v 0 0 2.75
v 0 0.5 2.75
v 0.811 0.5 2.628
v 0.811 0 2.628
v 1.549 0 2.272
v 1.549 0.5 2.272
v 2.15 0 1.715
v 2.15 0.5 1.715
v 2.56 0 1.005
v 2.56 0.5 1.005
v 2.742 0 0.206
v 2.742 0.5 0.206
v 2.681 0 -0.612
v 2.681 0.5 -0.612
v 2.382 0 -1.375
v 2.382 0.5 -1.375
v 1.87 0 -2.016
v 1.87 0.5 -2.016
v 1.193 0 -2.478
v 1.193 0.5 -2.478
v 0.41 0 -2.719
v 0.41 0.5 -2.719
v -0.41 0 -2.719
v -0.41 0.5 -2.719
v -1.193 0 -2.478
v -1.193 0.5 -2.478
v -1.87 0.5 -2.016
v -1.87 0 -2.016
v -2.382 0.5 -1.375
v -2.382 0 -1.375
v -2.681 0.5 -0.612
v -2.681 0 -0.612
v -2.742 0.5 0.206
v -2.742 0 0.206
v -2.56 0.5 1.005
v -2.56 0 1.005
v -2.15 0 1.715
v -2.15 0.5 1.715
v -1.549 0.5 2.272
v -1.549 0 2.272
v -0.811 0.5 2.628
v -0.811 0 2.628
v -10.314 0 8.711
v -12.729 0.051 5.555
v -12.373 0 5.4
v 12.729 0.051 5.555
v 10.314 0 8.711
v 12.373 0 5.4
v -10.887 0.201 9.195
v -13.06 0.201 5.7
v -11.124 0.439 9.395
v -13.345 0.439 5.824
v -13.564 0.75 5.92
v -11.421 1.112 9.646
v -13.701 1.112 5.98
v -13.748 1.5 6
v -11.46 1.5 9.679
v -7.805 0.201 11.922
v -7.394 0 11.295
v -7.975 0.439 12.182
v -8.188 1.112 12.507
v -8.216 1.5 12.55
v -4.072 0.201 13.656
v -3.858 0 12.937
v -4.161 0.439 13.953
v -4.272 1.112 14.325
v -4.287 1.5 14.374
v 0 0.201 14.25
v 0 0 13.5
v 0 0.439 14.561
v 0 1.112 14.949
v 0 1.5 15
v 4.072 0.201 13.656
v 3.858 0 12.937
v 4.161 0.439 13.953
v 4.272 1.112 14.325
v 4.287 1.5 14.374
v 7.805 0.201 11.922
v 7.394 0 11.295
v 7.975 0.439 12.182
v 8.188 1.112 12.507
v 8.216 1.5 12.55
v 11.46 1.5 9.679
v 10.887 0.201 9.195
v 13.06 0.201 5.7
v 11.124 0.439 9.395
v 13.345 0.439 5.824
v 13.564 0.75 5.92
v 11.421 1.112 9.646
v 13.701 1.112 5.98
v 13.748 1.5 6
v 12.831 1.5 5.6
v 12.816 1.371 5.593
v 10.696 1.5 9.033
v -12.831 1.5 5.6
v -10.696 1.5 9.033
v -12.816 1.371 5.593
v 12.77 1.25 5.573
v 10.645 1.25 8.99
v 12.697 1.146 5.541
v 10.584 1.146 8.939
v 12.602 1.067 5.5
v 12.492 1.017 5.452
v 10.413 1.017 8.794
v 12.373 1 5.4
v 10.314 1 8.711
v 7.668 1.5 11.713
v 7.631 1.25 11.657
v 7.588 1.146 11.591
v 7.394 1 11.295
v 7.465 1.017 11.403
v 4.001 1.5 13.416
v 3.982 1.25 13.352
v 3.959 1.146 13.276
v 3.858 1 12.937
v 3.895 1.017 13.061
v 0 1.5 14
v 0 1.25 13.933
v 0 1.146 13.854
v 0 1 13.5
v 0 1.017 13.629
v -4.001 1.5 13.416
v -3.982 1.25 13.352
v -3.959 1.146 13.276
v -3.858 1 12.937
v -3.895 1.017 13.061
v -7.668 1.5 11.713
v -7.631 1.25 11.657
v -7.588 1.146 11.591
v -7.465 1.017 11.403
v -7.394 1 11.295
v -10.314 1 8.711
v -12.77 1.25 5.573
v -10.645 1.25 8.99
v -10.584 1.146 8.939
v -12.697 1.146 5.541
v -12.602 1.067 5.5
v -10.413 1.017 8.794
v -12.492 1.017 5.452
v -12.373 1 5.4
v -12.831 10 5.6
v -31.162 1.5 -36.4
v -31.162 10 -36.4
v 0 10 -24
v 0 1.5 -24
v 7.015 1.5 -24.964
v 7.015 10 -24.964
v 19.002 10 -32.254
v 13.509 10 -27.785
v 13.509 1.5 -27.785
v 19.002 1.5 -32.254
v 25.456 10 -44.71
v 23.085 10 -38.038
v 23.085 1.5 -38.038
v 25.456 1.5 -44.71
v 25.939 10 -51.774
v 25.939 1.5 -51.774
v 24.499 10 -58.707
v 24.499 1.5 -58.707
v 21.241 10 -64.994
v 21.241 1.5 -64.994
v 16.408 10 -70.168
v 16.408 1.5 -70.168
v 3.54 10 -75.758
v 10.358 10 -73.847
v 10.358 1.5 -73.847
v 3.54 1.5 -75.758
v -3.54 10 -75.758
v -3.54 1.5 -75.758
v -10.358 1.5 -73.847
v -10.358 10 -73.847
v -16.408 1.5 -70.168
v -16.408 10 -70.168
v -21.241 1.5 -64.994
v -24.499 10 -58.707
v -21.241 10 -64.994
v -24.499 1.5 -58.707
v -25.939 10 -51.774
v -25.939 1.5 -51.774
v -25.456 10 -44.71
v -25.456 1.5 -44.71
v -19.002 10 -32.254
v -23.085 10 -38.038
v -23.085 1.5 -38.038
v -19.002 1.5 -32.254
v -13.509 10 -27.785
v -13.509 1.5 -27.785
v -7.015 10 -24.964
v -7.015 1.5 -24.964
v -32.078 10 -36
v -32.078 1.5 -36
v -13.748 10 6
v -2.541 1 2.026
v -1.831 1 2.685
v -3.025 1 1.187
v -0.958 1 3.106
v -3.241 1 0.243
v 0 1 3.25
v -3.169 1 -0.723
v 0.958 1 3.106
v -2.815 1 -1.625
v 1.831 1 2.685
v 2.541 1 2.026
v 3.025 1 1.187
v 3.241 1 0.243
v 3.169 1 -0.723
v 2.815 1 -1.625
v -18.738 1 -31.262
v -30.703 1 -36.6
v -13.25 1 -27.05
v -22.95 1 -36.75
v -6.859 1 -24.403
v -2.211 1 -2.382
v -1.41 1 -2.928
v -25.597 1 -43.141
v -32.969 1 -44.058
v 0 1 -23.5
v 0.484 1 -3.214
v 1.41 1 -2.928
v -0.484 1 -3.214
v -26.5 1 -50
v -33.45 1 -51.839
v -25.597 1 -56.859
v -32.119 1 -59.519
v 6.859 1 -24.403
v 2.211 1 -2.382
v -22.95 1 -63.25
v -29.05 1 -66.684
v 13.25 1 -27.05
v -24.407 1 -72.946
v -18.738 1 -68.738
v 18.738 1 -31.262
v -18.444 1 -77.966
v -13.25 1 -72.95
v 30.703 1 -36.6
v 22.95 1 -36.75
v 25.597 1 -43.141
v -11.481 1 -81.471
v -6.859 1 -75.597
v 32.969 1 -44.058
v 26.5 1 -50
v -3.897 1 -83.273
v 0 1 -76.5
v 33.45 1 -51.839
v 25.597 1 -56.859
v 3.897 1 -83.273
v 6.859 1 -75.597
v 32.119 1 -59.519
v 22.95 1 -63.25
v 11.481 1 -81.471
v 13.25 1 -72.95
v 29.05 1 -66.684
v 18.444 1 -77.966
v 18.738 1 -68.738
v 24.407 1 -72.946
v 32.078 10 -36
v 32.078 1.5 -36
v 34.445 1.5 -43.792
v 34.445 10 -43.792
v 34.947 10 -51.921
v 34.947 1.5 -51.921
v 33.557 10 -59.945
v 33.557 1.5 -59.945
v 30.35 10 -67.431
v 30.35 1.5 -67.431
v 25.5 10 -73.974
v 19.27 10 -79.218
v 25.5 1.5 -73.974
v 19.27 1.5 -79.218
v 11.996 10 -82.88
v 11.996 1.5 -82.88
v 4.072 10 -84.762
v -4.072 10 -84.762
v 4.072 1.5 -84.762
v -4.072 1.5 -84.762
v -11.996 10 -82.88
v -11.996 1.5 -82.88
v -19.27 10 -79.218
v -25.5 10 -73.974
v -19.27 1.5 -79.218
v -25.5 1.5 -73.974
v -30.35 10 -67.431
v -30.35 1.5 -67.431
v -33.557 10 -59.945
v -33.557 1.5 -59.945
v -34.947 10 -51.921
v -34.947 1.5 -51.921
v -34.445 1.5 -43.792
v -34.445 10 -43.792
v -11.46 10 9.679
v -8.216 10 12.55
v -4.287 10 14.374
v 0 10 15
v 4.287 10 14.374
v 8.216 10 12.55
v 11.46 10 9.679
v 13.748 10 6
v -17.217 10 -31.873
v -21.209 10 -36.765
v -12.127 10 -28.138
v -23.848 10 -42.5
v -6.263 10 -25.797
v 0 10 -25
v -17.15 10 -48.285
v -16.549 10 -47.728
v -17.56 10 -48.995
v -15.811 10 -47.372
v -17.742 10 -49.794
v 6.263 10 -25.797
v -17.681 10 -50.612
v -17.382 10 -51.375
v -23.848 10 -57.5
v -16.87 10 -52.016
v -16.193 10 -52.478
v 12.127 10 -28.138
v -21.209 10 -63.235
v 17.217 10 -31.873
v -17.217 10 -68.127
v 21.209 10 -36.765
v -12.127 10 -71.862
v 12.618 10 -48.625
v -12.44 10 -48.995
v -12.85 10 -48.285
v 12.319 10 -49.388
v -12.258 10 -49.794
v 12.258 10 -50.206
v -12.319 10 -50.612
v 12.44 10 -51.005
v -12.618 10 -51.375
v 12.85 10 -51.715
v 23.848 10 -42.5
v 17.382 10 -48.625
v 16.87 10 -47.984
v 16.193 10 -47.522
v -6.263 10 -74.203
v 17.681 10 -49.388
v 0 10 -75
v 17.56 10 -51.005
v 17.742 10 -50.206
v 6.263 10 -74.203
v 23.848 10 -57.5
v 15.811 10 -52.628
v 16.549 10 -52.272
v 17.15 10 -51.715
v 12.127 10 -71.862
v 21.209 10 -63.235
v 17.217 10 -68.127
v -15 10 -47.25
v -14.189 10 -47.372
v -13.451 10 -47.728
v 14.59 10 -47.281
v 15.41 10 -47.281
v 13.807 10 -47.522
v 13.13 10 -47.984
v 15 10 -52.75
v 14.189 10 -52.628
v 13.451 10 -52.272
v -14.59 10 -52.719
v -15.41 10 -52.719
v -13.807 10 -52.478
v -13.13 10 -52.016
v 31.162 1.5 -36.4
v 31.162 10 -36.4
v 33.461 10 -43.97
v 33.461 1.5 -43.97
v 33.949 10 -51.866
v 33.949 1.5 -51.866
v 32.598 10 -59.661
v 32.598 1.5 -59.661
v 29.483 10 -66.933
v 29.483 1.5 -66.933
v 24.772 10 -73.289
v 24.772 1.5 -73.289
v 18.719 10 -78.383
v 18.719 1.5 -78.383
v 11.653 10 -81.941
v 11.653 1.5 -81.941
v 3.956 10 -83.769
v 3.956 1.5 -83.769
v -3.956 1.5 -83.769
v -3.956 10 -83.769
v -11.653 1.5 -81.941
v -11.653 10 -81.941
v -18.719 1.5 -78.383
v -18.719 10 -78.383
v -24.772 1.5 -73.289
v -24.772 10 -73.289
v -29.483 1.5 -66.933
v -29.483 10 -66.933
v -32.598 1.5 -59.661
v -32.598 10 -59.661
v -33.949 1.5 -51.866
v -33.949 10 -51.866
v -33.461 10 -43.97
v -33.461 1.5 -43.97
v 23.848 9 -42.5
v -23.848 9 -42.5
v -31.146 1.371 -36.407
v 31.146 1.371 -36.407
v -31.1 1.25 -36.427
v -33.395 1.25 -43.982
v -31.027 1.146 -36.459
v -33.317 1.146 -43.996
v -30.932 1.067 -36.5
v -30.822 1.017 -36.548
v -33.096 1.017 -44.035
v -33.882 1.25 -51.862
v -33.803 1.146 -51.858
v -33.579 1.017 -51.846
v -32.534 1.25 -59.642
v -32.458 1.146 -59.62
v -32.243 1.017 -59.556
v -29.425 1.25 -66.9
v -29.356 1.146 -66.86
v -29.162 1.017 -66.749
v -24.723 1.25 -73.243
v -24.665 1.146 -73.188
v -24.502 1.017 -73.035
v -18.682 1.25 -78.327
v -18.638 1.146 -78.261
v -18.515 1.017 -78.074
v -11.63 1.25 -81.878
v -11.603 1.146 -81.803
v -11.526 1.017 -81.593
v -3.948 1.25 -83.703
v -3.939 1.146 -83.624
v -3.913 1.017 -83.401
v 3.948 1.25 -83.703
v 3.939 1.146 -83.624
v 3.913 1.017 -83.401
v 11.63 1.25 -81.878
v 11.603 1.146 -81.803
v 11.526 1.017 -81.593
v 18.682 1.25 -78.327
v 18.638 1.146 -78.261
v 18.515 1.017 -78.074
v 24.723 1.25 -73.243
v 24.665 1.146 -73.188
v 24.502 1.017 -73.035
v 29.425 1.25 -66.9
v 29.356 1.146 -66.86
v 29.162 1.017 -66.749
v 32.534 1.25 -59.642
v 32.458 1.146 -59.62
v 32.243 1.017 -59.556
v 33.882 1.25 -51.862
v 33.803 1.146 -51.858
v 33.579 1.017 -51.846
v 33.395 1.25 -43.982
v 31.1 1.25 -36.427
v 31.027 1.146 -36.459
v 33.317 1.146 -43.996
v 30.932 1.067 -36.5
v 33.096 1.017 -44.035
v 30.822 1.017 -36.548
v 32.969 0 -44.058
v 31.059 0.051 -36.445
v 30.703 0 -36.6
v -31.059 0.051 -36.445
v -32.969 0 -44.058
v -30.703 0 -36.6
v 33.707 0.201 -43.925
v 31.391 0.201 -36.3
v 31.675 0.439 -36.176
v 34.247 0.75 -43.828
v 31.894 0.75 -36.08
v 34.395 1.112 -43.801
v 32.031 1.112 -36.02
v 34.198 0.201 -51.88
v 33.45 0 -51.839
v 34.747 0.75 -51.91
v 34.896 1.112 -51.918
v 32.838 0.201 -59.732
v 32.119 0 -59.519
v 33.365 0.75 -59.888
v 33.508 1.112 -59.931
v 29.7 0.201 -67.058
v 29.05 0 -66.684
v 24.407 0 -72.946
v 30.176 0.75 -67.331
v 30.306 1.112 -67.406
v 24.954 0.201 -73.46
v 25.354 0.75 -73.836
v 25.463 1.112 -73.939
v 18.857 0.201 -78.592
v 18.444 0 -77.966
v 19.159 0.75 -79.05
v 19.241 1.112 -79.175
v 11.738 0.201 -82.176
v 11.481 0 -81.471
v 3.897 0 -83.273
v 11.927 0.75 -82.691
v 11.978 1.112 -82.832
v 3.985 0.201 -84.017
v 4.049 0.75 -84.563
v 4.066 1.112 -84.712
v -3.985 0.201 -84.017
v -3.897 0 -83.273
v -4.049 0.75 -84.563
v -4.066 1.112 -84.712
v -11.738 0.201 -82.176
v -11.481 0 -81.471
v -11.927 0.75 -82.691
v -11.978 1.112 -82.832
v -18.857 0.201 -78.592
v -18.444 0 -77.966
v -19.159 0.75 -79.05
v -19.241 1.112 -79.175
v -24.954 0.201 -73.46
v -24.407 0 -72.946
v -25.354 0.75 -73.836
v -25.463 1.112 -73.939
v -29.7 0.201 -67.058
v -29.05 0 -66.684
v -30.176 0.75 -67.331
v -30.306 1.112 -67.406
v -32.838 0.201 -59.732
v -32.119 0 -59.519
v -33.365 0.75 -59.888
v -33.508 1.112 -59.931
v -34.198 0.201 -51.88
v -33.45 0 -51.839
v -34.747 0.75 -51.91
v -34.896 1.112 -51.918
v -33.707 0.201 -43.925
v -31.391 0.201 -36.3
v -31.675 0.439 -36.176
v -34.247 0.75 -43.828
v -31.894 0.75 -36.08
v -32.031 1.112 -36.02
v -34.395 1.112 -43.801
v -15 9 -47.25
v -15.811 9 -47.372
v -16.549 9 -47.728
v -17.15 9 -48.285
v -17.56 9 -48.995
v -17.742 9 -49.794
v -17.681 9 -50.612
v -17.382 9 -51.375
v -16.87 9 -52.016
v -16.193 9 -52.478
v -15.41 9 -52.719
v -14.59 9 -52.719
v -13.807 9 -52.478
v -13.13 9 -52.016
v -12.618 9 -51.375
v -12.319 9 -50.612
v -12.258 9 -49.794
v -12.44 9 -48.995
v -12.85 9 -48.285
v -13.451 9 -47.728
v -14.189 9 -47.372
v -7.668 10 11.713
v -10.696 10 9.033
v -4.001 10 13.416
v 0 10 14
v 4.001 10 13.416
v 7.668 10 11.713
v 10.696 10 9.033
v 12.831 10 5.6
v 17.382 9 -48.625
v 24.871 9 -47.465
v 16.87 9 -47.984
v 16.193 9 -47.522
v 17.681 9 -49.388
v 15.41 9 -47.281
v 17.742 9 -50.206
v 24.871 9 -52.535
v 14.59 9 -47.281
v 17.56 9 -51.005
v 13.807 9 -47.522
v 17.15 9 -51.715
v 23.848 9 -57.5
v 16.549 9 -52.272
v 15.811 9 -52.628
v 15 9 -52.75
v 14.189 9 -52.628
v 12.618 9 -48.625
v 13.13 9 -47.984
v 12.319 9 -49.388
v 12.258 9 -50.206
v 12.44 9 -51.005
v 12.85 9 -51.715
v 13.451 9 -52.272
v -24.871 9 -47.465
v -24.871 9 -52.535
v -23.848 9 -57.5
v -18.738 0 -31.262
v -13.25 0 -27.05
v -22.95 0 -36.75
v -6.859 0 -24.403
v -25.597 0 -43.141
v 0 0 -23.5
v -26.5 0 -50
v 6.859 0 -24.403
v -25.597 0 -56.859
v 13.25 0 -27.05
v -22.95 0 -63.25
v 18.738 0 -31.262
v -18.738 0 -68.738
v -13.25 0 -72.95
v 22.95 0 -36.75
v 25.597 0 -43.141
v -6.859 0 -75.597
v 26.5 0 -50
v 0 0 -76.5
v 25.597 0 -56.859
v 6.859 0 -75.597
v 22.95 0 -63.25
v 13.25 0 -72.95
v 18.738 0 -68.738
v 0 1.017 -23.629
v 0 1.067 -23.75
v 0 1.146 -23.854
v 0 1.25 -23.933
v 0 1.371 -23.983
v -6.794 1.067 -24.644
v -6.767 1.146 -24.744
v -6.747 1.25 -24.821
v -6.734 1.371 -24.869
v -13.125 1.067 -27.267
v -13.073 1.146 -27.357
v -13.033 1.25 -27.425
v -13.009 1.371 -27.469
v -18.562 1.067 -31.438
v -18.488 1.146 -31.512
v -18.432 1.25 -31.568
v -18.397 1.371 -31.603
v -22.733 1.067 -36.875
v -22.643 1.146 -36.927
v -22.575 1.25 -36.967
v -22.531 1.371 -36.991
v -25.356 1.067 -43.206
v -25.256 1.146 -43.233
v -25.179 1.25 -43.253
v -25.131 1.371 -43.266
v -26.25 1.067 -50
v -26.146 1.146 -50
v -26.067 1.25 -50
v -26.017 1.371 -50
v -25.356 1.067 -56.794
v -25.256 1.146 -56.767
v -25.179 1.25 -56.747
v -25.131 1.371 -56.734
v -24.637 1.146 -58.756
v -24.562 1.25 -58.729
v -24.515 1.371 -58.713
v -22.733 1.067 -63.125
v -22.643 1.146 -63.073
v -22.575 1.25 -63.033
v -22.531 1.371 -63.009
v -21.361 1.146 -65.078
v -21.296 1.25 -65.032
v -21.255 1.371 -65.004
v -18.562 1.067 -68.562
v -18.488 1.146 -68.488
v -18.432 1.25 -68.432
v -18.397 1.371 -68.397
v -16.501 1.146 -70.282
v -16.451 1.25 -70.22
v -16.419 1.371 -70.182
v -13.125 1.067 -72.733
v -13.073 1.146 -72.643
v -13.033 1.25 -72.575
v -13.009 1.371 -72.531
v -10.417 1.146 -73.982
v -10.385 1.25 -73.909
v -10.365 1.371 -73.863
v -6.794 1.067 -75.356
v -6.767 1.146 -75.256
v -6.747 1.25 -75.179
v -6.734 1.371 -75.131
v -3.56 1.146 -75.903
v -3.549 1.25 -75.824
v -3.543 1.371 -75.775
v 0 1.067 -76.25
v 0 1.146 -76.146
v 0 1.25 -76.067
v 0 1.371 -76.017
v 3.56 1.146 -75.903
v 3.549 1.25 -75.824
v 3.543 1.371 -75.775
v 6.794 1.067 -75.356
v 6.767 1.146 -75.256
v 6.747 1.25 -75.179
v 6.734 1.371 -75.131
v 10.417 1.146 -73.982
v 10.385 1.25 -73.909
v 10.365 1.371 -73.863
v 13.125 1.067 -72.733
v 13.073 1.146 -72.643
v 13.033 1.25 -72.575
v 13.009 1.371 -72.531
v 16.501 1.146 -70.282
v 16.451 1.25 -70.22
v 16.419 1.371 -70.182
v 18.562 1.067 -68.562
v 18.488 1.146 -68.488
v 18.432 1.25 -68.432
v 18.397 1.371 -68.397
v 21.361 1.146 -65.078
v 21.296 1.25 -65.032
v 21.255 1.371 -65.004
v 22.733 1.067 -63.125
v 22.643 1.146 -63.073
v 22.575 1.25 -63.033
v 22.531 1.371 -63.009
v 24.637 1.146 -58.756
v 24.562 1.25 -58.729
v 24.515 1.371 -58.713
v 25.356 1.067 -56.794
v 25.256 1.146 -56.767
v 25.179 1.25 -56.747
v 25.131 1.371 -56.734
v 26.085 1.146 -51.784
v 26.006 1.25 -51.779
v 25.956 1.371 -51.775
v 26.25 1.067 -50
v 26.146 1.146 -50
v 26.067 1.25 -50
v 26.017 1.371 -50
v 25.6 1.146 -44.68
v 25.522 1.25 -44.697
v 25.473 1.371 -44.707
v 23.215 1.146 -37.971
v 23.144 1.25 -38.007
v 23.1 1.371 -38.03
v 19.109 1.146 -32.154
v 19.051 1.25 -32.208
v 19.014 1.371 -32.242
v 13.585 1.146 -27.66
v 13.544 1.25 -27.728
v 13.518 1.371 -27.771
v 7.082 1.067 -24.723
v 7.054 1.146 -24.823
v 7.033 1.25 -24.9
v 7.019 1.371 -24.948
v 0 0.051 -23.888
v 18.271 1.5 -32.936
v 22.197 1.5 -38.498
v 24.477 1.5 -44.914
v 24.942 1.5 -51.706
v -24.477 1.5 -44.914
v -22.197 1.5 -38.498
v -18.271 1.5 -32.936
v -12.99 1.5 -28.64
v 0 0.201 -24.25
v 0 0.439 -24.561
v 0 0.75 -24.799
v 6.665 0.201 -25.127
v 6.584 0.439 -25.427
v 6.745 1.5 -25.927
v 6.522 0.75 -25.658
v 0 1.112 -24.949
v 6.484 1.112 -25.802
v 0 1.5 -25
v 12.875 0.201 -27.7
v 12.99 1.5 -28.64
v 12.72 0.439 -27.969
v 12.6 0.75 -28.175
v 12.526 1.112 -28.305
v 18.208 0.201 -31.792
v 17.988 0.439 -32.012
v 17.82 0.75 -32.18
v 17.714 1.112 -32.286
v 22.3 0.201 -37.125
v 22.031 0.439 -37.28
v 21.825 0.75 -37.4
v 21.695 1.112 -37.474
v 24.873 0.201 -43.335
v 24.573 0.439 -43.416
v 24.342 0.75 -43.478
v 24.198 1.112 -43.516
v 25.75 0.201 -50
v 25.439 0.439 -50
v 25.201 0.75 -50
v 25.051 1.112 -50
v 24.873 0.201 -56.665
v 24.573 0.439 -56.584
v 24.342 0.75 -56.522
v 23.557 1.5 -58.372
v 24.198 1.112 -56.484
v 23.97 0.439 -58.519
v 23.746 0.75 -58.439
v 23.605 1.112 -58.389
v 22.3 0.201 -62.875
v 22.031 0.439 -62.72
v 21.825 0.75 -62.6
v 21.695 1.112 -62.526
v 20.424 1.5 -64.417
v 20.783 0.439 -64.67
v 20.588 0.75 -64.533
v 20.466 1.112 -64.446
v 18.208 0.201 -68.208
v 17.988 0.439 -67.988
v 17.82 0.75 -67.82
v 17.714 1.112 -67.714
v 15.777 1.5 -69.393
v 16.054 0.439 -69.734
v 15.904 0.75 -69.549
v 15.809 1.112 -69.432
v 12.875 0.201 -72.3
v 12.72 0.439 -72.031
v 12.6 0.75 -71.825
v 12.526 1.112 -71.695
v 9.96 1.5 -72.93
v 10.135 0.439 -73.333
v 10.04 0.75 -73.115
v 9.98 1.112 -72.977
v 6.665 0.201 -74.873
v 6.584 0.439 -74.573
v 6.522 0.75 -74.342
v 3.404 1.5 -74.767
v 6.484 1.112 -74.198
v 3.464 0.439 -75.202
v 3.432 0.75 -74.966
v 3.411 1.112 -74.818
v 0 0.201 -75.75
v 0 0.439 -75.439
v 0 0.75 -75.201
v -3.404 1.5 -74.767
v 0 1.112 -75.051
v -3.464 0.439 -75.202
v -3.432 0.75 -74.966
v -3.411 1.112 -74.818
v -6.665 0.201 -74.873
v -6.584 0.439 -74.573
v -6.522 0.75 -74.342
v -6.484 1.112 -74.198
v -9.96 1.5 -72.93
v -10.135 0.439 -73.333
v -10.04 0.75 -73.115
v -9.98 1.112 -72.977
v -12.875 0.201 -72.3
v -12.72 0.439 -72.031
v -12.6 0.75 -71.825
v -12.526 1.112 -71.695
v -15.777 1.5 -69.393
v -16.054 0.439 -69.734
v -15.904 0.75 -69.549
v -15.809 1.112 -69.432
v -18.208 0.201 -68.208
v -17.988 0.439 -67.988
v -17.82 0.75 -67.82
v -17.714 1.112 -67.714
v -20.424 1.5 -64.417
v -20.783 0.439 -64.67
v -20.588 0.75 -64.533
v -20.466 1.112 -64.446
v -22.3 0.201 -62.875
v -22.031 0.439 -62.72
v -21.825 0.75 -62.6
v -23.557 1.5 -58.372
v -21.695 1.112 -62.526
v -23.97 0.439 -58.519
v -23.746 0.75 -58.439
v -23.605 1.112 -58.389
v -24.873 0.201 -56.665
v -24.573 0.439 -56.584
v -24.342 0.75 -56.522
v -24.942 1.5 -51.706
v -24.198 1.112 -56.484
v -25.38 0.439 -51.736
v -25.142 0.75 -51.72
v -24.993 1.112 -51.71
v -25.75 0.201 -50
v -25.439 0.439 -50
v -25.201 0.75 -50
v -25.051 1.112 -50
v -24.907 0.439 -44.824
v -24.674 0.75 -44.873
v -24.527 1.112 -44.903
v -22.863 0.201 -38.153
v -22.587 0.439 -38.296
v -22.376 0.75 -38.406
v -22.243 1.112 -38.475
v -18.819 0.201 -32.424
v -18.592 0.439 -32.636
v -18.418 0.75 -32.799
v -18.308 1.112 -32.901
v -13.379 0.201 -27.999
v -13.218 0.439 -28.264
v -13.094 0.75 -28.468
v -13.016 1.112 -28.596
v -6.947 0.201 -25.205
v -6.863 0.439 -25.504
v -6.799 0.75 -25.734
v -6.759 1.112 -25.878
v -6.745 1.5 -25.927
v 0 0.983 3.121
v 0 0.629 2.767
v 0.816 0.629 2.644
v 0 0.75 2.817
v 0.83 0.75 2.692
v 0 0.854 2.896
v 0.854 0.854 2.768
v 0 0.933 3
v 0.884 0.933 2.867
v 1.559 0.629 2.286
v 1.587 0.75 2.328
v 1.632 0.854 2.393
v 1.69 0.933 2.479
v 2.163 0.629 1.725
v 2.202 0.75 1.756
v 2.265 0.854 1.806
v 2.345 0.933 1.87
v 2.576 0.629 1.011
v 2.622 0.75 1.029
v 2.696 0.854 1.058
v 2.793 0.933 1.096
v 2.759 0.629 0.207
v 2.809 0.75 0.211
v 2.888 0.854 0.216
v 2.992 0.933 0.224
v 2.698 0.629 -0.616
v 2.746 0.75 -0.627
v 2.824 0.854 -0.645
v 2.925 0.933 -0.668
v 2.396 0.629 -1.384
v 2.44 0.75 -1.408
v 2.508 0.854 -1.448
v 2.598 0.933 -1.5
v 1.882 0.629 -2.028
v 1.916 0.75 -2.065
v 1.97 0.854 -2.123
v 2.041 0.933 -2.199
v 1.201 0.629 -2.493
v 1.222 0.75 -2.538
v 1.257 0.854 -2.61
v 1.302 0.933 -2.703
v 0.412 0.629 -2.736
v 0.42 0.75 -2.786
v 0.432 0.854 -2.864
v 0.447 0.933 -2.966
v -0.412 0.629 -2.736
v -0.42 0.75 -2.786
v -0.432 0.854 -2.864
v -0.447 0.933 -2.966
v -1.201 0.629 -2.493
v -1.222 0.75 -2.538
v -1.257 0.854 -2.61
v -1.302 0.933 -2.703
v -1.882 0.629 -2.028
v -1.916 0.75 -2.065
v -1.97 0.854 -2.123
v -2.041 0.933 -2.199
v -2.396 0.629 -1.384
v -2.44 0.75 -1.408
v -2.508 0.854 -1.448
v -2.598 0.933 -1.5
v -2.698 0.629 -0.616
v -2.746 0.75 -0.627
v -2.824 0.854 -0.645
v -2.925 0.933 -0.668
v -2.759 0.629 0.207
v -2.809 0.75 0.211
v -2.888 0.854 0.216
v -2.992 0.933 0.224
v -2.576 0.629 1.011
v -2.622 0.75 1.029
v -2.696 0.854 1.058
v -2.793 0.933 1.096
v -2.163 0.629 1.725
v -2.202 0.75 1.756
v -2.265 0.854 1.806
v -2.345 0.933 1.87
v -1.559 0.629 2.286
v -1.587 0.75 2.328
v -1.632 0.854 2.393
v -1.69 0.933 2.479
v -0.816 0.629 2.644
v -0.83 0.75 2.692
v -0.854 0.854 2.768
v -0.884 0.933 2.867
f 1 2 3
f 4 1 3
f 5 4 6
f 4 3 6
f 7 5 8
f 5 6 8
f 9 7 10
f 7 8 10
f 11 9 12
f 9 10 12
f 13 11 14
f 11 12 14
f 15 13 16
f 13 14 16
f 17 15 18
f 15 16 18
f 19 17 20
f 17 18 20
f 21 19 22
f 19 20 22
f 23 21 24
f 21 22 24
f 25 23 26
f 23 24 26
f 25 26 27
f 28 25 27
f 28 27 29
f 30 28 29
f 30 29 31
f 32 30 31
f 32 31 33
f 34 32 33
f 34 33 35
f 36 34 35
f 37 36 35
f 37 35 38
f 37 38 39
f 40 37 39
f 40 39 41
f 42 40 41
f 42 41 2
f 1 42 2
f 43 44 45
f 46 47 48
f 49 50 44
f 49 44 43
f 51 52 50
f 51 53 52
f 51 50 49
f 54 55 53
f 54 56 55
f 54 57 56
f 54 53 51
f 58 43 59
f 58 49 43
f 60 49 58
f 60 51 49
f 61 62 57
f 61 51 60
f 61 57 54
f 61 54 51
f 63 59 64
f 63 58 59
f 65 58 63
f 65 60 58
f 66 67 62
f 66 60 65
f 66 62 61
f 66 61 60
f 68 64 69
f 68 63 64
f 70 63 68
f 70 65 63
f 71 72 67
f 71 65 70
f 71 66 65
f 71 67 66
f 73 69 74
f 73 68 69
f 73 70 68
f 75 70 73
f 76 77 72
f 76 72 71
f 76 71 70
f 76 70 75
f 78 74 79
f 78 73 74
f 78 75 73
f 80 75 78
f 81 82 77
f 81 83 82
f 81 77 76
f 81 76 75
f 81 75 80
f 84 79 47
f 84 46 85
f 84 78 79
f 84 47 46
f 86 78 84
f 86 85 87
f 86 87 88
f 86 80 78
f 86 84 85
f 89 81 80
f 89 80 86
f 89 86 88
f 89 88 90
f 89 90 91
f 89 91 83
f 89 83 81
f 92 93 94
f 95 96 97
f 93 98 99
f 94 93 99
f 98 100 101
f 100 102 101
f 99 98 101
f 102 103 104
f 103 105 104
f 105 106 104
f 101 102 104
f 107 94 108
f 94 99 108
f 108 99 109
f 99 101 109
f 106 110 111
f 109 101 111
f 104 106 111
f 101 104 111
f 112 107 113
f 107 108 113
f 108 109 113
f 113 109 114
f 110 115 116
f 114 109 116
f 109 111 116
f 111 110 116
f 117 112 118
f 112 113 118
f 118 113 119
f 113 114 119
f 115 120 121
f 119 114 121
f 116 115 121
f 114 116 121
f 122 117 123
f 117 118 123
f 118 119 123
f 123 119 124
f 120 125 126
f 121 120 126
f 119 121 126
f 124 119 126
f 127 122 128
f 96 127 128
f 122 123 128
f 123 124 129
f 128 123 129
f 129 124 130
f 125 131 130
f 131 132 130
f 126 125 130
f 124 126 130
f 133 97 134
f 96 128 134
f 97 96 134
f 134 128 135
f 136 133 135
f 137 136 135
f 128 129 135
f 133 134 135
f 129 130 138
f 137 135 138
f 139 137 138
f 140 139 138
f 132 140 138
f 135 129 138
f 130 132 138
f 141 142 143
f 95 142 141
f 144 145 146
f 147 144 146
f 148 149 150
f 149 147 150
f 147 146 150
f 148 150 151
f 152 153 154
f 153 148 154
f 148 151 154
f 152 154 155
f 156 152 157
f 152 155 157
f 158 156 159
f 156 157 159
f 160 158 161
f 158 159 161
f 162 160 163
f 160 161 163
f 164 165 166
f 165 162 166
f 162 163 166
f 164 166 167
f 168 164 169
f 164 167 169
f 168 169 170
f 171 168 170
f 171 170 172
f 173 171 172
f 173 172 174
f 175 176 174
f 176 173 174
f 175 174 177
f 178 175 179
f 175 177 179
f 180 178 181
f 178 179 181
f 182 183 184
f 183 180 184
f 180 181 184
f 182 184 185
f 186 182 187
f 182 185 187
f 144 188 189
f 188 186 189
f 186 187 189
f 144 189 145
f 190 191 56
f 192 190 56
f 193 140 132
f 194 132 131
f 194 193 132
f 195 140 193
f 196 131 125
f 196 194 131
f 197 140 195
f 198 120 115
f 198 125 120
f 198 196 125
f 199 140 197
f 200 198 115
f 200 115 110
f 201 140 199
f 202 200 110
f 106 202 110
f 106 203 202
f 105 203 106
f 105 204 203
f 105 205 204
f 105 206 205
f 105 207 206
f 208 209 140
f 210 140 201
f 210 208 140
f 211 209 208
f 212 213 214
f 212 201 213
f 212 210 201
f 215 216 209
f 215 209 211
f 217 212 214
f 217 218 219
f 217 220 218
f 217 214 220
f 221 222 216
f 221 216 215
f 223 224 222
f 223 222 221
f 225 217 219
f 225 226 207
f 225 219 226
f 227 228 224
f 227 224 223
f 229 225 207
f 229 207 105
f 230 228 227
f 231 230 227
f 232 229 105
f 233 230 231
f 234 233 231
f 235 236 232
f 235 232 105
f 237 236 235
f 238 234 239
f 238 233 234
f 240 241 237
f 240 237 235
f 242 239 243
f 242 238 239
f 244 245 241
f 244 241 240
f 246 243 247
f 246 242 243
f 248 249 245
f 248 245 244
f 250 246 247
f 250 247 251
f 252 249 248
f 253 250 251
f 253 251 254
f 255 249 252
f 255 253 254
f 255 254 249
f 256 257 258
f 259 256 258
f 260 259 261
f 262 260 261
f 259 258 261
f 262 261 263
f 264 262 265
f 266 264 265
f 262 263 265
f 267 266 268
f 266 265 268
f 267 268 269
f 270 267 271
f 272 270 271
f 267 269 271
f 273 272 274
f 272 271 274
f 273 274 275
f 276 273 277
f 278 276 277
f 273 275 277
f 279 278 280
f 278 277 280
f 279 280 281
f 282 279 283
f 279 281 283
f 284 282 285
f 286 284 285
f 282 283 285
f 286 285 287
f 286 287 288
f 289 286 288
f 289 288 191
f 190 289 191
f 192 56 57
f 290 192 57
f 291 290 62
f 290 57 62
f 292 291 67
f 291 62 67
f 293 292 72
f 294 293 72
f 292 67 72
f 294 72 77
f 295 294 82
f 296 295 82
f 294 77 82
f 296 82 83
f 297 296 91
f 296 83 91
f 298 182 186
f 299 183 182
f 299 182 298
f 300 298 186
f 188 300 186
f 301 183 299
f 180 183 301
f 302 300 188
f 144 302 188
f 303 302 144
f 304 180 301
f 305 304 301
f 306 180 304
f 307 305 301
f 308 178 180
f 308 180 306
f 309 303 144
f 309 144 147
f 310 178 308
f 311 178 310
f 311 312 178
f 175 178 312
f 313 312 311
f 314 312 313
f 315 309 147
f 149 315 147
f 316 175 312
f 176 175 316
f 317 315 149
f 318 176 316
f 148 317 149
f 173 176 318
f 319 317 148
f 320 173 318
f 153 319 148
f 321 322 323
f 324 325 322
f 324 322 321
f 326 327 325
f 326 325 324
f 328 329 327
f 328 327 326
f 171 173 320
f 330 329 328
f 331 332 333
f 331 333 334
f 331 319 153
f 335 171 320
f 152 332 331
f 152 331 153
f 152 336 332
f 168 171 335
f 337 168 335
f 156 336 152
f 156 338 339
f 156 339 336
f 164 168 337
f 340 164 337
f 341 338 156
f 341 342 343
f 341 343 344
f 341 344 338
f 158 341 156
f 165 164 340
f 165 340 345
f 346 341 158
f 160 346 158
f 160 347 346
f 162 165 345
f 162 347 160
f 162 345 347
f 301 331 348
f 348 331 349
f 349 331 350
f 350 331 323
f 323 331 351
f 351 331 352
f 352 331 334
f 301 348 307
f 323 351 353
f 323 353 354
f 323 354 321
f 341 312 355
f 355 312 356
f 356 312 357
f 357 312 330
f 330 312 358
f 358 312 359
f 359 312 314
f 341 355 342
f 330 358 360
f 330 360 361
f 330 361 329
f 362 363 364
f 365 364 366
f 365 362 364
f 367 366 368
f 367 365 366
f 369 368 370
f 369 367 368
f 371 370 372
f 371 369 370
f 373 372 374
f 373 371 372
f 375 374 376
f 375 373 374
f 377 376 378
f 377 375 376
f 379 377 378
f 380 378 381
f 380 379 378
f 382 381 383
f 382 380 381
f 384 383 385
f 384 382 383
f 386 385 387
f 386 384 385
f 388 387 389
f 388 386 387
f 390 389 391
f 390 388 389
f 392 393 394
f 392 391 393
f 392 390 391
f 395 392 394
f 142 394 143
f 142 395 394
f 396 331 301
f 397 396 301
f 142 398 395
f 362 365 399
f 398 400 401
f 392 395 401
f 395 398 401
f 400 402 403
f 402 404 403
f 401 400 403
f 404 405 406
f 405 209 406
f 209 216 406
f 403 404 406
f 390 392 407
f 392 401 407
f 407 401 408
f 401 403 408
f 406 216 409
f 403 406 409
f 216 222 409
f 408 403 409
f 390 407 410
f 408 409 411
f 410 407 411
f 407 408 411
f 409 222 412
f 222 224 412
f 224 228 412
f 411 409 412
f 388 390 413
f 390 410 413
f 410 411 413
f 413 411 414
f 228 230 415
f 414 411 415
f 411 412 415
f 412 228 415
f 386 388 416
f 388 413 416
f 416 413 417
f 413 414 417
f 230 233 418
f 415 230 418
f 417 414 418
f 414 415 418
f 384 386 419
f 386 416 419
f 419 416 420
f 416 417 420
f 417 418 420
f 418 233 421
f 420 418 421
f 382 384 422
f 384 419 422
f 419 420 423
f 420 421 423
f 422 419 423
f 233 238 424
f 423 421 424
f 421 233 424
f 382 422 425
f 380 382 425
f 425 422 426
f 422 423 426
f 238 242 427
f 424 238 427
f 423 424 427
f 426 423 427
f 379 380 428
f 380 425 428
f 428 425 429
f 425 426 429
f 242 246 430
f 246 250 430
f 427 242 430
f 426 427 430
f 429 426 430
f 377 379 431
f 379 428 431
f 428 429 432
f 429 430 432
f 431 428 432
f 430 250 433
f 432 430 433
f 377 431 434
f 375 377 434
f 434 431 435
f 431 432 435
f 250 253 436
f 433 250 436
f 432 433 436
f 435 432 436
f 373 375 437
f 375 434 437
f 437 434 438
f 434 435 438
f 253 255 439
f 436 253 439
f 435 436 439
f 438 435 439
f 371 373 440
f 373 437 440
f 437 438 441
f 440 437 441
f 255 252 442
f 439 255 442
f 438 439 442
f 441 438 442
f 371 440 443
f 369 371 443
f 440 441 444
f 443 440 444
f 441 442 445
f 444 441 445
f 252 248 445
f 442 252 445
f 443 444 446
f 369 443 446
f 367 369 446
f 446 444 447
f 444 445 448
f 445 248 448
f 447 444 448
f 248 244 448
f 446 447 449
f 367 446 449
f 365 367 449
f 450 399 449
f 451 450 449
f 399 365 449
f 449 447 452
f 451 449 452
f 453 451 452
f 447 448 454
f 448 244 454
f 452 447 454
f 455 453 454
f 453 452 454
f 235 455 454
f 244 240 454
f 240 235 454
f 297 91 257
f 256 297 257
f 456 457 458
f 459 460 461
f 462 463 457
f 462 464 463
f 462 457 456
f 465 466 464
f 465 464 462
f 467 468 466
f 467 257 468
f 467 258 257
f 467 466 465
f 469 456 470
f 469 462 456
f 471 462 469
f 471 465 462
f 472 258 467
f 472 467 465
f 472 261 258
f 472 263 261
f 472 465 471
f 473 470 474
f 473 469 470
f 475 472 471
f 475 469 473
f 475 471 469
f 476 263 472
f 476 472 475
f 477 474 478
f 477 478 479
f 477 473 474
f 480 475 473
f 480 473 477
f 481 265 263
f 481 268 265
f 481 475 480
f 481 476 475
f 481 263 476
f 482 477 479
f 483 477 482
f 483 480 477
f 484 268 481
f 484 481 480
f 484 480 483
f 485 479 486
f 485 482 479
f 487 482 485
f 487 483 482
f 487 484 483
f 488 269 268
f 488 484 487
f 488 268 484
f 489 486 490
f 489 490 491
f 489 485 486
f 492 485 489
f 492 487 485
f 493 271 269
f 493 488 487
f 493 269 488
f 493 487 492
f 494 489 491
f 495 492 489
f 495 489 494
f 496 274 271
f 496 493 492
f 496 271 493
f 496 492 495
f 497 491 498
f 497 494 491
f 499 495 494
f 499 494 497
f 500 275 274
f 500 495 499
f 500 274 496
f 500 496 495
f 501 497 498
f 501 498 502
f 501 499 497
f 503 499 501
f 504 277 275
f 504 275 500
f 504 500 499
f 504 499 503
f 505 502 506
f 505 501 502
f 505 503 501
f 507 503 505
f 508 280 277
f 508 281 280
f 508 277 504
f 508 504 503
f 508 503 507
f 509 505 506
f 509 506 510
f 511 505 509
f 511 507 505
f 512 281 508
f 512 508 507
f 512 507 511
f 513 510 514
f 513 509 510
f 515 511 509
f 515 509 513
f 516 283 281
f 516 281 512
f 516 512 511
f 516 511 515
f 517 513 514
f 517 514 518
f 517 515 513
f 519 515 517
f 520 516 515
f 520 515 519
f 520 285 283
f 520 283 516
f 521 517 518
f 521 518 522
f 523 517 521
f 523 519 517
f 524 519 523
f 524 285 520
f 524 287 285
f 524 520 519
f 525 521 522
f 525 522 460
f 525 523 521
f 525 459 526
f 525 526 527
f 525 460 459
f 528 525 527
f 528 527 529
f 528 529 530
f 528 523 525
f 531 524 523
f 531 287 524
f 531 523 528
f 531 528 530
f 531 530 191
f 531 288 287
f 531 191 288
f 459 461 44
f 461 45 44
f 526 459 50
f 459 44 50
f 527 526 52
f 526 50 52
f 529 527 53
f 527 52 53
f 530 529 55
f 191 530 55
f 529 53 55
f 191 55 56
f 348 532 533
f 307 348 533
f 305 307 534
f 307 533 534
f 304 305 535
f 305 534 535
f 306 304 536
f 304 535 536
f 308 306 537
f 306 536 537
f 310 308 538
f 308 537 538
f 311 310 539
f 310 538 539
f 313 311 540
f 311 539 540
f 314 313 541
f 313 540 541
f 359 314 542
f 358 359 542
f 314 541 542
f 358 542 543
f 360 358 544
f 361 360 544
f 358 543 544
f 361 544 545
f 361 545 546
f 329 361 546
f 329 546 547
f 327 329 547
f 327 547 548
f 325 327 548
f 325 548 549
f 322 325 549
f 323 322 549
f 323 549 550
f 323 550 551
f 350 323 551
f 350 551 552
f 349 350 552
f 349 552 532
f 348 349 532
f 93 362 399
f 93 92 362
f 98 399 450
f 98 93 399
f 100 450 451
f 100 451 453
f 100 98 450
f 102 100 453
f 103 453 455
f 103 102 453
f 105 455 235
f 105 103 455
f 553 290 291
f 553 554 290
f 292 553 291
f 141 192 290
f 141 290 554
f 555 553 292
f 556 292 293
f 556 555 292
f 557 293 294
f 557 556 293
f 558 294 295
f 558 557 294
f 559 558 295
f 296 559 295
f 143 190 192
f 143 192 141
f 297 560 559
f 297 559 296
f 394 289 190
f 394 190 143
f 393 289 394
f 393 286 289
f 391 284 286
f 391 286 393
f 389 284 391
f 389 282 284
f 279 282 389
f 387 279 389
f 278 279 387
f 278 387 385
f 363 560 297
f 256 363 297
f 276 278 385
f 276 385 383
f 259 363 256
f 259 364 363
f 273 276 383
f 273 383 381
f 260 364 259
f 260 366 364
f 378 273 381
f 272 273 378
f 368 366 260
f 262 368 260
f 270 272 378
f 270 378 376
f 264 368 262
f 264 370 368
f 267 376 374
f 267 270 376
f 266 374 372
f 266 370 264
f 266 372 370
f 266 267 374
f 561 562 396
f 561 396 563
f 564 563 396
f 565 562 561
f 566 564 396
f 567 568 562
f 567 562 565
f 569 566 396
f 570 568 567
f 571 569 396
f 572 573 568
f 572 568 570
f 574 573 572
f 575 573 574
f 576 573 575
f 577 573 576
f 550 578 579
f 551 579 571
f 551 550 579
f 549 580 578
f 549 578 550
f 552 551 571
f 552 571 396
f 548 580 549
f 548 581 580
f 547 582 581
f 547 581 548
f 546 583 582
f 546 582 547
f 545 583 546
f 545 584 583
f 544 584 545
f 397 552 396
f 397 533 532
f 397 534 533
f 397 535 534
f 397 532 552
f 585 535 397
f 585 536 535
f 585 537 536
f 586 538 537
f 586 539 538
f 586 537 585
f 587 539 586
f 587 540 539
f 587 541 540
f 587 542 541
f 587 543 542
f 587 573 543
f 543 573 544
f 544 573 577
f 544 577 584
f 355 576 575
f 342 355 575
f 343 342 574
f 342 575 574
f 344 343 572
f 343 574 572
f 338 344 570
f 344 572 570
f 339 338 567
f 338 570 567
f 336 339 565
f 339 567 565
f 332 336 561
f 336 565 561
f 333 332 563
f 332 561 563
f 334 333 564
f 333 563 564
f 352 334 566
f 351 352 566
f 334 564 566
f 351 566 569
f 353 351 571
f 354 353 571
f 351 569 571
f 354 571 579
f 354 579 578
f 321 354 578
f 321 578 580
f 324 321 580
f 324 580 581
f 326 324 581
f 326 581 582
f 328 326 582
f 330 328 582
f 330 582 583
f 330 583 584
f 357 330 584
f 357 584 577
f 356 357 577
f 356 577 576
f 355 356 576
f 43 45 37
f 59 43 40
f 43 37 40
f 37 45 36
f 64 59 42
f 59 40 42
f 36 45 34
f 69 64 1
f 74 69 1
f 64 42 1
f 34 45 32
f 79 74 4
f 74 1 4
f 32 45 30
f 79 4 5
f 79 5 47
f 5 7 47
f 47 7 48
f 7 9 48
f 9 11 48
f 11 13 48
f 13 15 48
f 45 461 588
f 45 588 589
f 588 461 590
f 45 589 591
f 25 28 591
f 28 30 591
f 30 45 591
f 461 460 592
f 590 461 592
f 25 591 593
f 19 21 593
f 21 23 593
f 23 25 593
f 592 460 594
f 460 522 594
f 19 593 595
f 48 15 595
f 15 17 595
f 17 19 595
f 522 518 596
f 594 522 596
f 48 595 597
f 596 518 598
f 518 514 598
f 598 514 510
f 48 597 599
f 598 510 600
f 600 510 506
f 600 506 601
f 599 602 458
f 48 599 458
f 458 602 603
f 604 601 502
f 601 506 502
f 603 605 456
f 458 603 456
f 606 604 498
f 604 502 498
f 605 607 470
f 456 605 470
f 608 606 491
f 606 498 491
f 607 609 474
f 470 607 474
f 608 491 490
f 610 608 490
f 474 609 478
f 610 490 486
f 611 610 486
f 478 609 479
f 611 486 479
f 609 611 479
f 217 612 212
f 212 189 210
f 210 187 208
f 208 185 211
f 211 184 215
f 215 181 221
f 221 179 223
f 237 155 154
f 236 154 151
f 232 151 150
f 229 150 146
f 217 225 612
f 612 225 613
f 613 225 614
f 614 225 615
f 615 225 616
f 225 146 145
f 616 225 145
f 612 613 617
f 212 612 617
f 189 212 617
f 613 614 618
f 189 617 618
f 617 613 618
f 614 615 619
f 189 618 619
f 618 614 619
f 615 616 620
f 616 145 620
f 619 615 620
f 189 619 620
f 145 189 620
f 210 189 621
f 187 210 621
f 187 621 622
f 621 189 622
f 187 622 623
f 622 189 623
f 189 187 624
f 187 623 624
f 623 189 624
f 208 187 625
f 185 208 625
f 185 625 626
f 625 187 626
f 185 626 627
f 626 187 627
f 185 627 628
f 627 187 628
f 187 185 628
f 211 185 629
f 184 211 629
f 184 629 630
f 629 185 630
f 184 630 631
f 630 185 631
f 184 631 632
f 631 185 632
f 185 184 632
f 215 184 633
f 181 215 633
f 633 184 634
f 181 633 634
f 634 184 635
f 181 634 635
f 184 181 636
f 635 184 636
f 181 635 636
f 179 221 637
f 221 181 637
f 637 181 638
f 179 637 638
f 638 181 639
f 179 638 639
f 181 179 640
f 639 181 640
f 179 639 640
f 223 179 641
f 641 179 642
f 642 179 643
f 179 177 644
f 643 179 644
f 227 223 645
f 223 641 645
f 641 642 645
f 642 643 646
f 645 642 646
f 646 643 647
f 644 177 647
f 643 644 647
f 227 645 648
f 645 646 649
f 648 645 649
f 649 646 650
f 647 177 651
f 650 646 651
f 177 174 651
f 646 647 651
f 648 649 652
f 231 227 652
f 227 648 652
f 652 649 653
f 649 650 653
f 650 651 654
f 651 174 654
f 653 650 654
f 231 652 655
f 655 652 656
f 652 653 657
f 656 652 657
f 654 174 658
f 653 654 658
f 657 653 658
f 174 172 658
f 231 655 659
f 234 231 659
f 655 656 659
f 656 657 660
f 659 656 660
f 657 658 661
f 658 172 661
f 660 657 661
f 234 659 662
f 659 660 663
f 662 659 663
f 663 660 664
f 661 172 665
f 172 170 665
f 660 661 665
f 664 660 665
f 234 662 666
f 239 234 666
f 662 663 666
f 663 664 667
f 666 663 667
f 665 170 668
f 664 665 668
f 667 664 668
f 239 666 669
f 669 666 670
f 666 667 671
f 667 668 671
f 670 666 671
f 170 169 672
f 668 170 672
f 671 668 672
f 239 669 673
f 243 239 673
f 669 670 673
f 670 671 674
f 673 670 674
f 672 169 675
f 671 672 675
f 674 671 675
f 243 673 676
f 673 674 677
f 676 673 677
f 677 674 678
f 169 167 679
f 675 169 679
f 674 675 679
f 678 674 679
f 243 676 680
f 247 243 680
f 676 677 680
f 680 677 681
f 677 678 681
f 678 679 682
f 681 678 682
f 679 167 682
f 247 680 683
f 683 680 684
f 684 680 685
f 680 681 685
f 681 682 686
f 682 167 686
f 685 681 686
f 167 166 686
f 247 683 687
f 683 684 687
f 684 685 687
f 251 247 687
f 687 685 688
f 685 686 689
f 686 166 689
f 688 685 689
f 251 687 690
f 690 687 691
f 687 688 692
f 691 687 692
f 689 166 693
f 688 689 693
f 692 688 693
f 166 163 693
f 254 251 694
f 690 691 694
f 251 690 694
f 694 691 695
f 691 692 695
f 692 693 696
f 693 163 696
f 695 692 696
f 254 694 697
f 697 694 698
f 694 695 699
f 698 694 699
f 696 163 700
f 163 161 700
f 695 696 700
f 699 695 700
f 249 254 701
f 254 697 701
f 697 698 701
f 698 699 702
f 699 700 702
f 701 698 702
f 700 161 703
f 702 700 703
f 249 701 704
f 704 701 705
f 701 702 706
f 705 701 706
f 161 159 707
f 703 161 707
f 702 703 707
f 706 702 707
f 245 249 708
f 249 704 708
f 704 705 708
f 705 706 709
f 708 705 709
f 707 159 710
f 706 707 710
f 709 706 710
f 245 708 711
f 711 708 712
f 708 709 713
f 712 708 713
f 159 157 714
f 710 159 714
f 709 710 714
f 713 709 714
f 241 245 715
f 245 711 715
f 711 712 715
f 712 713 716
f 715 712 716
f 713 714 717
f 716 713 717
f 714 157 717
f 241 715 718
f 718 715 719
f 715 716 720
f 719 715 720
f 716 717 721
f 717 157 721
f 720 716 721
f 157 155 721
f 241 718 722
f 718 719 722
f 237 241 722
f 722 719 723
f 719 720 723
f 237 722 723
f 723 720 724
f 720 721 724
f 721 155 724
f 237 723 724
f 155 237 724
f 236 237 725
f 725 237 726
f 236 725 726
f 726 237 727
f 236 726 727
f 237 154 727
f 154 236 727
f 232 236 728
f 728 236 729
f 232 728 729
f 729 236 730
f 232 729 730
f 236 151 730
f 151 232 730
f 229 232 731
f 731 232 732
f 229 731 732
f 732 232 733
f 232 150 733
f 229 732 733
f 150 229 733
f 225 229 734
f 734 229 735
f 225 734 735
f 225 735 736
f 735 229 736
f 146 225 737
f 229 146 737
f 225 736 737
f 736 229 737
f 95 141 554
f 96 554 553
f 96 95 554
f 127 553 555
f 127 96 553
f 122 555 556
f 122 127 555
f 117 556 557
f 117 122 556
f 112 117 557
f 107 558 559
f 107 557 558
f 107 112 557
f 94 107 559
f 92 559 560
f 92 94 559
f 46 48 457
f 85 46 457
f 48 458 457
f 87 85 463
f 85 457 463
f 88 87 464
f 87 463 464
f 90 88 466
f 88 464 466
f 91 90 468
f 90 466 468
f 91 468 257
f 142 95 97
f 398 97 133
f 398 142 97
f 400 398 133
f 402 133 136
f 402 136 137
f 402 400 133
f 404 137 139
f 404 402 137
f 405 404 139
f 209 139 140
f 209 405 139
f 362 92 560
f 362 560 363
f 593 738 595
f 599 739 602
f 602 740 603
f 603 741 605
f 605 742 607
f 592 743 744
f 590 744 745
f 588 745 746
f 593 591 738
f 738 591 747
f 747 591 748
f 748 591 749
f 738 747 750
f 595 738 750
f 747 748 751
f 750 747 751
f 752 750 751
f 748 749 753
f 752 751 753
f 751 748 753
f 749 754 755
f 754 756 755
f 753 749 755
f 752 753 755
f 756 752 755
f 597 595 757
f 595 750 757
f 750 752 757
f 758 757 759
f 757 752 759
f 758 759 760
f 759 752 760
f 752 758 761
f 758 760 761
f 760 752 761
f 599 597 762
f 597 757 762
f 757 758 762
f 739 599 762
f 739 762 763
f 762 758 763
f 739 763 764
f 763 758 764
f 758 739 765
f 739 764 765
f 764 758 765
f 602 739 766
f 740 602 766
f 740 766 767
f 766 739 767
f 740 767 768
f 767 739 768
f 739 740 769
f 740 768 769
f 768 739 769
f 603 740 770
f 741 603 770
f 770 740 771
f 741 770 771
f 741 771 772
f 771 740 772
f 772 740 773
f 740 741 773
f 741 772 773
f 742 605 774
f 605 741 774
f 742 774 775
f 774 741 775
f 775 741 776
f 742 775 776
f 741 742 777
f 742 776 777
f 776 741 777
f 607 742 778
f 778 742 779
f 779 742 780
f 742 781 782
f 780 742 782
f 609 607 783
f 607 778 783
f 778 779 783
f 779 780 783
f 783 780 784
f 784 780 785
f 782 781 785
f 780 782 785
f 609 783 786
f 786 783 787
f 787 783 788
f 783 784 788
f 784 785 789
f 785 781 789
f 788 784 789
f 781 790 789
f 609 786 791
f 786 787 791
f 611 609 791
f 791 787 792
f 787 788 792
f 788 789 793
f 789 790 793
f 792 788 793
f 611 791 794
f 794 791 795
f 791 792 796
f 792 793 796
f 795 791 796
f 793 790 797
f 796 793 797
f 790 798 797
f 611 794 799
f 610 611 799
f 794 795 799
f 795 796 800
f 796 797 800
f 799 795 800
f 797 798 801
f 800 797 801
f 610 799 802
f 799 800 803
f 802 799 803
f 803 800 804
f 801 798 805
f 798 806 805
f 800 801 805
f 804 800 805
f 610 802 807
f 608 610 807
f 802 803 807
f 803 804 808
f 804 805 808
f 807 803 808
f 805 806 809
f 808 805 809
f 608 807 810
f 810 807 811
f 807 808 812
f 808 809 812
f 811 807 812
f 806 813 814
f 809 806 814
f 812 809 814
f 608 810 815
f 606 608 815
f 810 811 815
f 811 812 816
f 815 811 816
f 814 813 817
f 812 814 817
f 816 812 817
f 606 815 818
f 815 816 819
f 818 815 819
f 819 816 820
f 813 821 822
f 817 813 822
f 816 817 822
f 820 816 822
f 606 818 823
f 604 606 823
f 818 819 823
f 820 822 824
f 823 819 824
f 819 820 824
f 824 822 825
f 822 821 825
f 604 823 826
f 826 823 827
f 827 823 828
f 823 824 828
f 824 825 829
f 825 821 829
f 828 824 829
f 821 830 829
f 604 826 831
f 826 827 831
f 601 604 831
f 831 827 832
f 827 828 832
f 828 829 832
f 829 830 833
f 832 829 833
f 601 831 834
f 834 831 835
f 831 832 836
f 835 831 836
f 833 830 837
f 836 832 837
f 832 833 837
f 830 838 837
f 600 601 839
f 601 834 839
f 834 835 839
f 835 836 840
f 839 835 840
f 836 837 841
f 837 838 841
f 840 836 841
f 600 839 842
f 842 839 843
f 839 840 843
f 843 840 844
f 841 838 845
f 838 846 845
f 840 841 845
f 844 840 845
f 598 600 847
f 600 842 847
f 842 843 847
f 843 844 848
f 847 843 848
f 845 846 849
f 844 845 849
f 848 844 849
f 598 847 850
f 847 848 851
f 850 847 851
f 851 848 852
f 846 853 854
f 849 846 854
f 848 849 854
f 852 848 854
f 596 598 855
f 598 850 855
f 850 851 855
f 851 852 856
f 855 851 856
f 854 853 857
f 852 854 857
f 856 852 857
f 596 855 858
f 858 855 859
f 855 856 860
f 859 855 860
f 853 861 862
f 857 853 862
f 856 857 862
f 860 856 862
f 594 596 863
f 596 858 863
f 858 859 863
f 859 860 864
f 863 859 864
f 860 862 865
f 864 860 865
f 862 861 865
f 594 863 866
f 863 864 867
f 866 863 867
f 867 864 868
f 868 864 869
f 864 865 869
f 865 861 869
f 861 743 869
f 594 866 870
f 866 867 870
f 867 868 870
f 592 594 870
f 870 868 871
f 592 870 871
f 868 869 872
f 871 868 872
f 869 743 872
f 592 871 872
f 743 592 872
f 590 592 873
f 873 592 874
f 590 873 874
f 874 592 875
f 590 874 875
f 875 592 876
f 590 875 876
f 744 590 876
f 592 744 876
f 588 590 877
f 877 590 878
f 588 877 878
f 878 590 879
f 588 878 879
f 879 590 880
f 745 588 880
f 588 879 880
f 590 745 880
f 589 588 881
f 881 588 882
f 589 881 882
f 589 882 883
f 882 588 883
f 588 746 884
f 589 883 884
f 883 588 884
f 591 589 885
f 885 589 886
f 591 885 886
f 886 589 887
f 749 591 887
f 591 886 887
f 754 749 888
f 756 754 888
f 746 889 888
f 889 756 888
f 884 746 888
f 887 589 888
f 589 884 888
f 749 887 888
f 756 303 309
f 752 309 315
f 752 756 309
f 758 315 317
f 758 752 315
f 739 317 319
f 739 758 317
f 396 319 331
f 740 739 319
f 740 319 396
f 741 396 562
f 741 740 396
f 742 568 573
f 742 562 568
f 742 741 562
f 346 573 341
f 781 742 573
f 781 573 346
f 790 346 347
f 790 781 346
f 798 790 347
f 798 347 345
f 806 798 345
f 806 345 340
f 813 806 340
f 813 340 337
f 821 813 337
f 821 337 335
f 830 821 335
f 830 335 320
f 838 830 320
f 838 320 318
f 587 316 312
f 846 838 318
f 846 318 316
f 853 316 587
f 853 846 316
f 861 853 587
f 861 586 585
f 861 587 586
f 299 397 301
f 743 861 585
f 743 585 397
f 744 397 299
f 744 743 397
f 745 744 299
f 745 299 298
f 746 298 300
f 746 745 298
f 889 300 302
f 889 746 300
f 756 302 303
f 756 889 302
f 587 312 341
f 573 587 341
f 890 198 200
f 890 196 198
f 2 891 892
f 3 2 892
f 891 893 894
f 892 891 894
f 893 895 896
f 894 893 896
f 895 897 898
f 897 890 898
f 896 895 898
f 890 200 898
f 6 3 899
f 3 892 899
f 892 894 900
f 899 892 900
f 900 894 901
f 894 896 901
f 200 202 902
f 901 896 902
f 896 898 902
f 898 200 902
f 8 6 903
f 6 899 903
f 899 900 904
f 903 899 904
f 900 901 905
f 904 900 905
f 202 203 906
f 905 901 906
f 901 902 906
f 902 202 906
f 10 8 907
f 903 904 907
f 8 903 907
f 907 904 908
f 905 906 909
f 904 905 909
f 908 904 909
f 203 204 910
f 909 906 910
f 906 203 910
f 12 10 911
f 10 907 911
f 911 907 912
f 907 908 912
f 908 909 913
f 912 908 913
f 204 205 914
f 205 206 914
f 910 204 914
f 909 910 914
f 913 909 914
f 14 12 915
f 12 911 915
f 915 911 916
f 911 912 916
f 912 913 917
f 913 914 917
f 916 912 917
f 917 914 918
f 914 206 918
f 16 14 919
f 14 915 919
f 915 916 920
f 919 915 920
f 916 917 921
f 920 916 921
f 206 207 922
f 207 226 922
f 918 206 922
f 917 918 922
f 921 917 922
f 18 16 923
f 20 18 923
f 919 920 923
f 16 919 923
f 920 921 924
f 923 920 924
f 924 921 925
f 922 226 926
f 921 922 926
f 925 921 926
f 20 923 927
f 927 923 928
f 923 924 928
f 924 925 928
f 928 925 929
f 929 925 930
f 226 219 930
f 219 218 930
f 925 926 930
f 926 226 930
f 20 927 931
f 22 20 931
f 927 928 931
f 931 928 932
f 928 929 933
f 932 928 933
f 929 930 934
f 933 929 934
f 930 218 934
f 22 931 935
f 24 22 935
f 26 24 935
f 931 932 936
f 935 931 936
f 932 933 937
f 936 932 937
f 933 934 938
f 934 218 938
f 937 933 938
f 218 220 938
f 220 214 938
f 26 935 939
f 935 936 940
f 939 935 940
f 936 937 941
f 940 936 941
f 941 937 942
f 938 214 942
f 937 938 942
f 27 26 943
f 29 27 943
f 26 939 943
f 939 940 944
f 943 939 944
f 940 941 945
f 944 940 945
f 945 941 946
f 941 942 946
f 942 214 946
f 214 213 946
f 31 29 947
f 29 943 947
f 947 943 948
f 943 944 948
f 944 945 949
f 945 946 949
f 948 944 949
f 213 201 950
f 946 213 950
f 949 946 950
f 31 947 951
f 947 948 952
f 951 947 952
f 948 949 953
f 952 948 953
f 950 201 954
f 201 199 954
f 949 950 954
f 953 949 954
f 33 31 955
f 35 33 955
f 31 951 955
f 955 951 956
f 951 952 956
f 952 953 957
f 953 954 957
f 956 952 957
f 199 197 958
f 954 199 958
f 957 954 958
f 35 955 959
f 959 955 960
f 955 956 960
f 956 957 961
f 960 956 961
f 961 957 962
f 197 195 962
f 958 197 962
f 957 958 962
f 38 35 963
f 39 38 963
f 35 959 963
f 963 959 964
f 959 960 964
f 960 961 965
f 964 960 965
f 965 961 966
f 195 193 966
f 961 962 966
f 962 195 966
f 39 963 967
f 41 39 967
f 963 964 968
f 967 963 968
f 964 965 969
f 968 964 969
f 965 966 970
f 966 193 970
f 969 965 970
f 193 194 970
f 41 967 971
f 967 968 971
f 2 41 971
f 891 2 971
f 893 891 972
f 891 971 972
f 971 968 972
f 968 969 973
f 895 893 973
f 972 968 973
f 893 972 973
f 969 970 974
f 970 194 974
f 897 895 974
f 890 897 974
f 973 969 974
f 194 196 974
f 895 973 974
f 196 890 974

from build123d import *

# Parameters (mm, degrees)
SKETCH1_R           = 25
BOSS_EXTRUDE1_DEPTH = 10
SHELL1_T            = -1
BOSS_EXTRUDE2_DEPTH = 1
CUT_EXTRUDE1_REACH  = 94.363
SKETCH4_R           = 2.75
FILLET1_R           = 0.5
FILLET2_R           = 1.5
CUT_EXTRUDE2_REACH  = 94.363
SKETCH5_R           = 2.75


with BuildPart() as part:
    # Sketch1 → Boss-Extrude1 (new body)
    with BuildSketch(Plane(origin=(0, 0, 0), x_dir=(1, 0, 0), z_dir=(0, 1, 0))):
        with BuildLine():
            Line((13.747727085, -6), (32.078029865, 36))
            ThreePointArc((32.078029865, 36), (0, 85), (-32.078029865, 36))
            Line((-32.078029865, 36), (-13.747727085, -6))
            ThreePointArc((-13.747727085, -6), (0, -15), (13.747727085, -6))
        make_face()
        with Locations(Location((0, 50, 0), (0, 0, 270))):
            Circle(SKETCH1_R, mode=Mode.SUBTRACT)
    extrude(amount=BOSS_EXTRUDE1_DEPTH)

    # Shell1
    shell1_openings = [part.faces().sort_by_distance(p)[0] for p in [
        (-21.794129173, 10, -15.488262225),
    ]]
    offset(amount=SHELL1_T, openings=shell1_openings, kind=Kind.INTERSECTION)

    # Sketch3 → Boss-Extrude2 (add)
    with BuildSketch(Plane(origin=(0, 10, 0), x_dir=(1, 0, 0), z_dir=(0, 1, 0))):
        with BuildLine():
            Line((-23.848480035, 57.5), (23.848480035, 57.5))
            ThreePointArc((23.848480035, 57.5), (25, 50), (23.848480035, 42.5))
            Line((23.848480035, 42.5), (-23.848480035, 42.5))
            ThreePointArc((-23.848480035, 42.5), (-25, 50), (-23.848480035, 57.5))
        make_face()
    extrude(amount=-BOSS_EXTRUDE2_DEPTH)

    # Sketch4 → Cut-Extrude1 (cut, up to next)
    with BuildSketch(Plane(origin=(0, 1, 0), x_dir=(1, 0, 0), z_dir=(0, 1, 0)), mode=Mode.PRIVATE) as cut_extrude1_sk1:
        with Locations(Location((0, 0, 0), (0, 0, 270))):
            Circle(SKETCH4_R)
    cut_extrude1_tool1 = extrude(cut_extrude1_sk1.sketch, amount=-CUT_EXTRUDE1_REACH, mode=Mode.PRIVATE) & part.part
    add(cut_extrude1_tool1.solids().sort_by_distance((0, 1, 0))[0], mode=Mode.SUBTRACT)

    # Fillet1
    fillet1_edges = [part.edges().sort_by_distance(p)[0] for p in [
        (0, 1, -76),
        (0, 1, 14),
        (21.996363336, 1, -15.4),
        (0, 1, -84),
        (-21.996363336, 1, -15.4),
        (0, 1, -2.75),
    ]]
    fillet(fillet1_edges, radius=FILLET1_R)

    # Fillet2
    fillet2_edges = [part.edges().sort_by_distance(p)[0] for p in [
        (0, 0, -75),
        (-22.912878475, 0, -15),
        (0, 0, -85),
        (22.912878475, 0, -15),
        (0, 0, 15),
    ]]
    fillet(fillet2_edges, radius=FILLET2_R)

    # Sketch5 → Cut-Extrude2 (cut, up to next)
    with BuildSketch(Plane.XZ.offset(-9), mode=Mode.PRIVATE) as cut_extrude2_sk1:
        with Locations(Location((15, -50, 0), (0, 0, 270))):
            Circle(SKETCH5_R)
    cut_extrude2_tool1 = extrude(cut_extrude2_sk1.sketch, amount=-CUT_EXTRUDE2_REACH, mode=Mode.PRIVATE) & part.part
    # Sketch5 → Cut-Extrude2 (cut, up to next)
    with BuildSketch(Plane.XZ.offset(-9), mode=Mode.PRIVATE) as cut_extrude2_sk2:
        with Locations(Location((-15, -50, 0), (0, 0, 90))):
            Circle(SKETCH5_R)
    cut_extrude2_tool2 = extrude(cut_extrude2_sk2.sketch, amount=-CUT_EXTRUDE2_REACH, mode=Mode.PRIVATE) & part.part
    add(cut_extrude2_tool1.solids().sort_by_distance((15, 9, -50))[0], mode=Mode.SUBTRACT)
    add(cut_extrude2_tool2.solids().sort_by_distance((-15, 9, -50))[0], mode=Mode.SUBTRACT)


solid = part.part
